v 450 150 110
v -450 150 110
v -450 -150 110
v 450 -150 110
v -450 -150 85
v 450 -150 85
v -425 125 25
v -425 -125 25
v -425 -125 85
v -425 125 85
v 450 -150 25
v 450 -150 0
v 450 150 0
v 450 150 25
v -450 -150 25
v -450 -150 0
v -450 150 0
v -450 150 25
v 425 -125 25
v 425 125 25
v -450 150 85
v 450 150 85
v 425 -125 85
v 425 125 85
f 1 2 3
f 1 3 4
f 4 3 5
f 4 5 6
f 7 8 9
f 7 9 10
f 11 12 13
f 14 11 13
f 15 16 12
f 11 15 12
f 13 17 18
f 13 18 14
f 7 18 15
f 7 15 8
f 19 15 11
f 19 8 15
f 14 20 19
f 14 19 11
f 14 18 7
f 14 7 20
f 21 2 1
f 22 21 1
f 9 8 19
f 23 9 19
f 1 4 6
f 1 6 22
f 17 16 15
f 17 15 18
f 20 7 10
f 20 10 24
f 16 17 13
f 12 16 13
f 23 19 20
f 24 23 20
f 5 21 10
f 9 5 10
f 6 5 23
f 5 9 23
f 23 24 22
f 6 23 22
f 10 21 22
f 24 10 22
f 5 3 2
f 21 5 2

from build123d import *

# Parameters (mm, degrees)
F0_W     = 900
F0_H     = 300
F1_DEPTH = 25
F2_W     = 850
F2_H     = 250
F3_DEPTH = 60


# Not quite as in the source:
# - a pattern or mirror of a feature is missing from the dataset's text; its kind, count and spacing are read off the source's solid


with BuildPart() as f1:
    # F0 (on Top) → F1 (new body)
    with BuildSketch(Plane.XY):
        Rectangle(F0_W, F0_H)
    extrude(amount=F1_DEPTH)


with BuildPart() as f1_copies_1:
    # F1_copies: instance of F1
    add(f1.part.mirror(Plane.XY.offset(55)))


with BuildPart() as f1_1:
    add(f1.part)

    add(f1_copies_1.part)  # F3 merges F1_copies_1
    # F2 (on face) → F3 (join)
    with BuildSketch(Plane.XY.offset(25)):
        Rectangle(F2_W, F2_H)
    extrude(amount=F3_DEPTH)


solid = f1_1.part
